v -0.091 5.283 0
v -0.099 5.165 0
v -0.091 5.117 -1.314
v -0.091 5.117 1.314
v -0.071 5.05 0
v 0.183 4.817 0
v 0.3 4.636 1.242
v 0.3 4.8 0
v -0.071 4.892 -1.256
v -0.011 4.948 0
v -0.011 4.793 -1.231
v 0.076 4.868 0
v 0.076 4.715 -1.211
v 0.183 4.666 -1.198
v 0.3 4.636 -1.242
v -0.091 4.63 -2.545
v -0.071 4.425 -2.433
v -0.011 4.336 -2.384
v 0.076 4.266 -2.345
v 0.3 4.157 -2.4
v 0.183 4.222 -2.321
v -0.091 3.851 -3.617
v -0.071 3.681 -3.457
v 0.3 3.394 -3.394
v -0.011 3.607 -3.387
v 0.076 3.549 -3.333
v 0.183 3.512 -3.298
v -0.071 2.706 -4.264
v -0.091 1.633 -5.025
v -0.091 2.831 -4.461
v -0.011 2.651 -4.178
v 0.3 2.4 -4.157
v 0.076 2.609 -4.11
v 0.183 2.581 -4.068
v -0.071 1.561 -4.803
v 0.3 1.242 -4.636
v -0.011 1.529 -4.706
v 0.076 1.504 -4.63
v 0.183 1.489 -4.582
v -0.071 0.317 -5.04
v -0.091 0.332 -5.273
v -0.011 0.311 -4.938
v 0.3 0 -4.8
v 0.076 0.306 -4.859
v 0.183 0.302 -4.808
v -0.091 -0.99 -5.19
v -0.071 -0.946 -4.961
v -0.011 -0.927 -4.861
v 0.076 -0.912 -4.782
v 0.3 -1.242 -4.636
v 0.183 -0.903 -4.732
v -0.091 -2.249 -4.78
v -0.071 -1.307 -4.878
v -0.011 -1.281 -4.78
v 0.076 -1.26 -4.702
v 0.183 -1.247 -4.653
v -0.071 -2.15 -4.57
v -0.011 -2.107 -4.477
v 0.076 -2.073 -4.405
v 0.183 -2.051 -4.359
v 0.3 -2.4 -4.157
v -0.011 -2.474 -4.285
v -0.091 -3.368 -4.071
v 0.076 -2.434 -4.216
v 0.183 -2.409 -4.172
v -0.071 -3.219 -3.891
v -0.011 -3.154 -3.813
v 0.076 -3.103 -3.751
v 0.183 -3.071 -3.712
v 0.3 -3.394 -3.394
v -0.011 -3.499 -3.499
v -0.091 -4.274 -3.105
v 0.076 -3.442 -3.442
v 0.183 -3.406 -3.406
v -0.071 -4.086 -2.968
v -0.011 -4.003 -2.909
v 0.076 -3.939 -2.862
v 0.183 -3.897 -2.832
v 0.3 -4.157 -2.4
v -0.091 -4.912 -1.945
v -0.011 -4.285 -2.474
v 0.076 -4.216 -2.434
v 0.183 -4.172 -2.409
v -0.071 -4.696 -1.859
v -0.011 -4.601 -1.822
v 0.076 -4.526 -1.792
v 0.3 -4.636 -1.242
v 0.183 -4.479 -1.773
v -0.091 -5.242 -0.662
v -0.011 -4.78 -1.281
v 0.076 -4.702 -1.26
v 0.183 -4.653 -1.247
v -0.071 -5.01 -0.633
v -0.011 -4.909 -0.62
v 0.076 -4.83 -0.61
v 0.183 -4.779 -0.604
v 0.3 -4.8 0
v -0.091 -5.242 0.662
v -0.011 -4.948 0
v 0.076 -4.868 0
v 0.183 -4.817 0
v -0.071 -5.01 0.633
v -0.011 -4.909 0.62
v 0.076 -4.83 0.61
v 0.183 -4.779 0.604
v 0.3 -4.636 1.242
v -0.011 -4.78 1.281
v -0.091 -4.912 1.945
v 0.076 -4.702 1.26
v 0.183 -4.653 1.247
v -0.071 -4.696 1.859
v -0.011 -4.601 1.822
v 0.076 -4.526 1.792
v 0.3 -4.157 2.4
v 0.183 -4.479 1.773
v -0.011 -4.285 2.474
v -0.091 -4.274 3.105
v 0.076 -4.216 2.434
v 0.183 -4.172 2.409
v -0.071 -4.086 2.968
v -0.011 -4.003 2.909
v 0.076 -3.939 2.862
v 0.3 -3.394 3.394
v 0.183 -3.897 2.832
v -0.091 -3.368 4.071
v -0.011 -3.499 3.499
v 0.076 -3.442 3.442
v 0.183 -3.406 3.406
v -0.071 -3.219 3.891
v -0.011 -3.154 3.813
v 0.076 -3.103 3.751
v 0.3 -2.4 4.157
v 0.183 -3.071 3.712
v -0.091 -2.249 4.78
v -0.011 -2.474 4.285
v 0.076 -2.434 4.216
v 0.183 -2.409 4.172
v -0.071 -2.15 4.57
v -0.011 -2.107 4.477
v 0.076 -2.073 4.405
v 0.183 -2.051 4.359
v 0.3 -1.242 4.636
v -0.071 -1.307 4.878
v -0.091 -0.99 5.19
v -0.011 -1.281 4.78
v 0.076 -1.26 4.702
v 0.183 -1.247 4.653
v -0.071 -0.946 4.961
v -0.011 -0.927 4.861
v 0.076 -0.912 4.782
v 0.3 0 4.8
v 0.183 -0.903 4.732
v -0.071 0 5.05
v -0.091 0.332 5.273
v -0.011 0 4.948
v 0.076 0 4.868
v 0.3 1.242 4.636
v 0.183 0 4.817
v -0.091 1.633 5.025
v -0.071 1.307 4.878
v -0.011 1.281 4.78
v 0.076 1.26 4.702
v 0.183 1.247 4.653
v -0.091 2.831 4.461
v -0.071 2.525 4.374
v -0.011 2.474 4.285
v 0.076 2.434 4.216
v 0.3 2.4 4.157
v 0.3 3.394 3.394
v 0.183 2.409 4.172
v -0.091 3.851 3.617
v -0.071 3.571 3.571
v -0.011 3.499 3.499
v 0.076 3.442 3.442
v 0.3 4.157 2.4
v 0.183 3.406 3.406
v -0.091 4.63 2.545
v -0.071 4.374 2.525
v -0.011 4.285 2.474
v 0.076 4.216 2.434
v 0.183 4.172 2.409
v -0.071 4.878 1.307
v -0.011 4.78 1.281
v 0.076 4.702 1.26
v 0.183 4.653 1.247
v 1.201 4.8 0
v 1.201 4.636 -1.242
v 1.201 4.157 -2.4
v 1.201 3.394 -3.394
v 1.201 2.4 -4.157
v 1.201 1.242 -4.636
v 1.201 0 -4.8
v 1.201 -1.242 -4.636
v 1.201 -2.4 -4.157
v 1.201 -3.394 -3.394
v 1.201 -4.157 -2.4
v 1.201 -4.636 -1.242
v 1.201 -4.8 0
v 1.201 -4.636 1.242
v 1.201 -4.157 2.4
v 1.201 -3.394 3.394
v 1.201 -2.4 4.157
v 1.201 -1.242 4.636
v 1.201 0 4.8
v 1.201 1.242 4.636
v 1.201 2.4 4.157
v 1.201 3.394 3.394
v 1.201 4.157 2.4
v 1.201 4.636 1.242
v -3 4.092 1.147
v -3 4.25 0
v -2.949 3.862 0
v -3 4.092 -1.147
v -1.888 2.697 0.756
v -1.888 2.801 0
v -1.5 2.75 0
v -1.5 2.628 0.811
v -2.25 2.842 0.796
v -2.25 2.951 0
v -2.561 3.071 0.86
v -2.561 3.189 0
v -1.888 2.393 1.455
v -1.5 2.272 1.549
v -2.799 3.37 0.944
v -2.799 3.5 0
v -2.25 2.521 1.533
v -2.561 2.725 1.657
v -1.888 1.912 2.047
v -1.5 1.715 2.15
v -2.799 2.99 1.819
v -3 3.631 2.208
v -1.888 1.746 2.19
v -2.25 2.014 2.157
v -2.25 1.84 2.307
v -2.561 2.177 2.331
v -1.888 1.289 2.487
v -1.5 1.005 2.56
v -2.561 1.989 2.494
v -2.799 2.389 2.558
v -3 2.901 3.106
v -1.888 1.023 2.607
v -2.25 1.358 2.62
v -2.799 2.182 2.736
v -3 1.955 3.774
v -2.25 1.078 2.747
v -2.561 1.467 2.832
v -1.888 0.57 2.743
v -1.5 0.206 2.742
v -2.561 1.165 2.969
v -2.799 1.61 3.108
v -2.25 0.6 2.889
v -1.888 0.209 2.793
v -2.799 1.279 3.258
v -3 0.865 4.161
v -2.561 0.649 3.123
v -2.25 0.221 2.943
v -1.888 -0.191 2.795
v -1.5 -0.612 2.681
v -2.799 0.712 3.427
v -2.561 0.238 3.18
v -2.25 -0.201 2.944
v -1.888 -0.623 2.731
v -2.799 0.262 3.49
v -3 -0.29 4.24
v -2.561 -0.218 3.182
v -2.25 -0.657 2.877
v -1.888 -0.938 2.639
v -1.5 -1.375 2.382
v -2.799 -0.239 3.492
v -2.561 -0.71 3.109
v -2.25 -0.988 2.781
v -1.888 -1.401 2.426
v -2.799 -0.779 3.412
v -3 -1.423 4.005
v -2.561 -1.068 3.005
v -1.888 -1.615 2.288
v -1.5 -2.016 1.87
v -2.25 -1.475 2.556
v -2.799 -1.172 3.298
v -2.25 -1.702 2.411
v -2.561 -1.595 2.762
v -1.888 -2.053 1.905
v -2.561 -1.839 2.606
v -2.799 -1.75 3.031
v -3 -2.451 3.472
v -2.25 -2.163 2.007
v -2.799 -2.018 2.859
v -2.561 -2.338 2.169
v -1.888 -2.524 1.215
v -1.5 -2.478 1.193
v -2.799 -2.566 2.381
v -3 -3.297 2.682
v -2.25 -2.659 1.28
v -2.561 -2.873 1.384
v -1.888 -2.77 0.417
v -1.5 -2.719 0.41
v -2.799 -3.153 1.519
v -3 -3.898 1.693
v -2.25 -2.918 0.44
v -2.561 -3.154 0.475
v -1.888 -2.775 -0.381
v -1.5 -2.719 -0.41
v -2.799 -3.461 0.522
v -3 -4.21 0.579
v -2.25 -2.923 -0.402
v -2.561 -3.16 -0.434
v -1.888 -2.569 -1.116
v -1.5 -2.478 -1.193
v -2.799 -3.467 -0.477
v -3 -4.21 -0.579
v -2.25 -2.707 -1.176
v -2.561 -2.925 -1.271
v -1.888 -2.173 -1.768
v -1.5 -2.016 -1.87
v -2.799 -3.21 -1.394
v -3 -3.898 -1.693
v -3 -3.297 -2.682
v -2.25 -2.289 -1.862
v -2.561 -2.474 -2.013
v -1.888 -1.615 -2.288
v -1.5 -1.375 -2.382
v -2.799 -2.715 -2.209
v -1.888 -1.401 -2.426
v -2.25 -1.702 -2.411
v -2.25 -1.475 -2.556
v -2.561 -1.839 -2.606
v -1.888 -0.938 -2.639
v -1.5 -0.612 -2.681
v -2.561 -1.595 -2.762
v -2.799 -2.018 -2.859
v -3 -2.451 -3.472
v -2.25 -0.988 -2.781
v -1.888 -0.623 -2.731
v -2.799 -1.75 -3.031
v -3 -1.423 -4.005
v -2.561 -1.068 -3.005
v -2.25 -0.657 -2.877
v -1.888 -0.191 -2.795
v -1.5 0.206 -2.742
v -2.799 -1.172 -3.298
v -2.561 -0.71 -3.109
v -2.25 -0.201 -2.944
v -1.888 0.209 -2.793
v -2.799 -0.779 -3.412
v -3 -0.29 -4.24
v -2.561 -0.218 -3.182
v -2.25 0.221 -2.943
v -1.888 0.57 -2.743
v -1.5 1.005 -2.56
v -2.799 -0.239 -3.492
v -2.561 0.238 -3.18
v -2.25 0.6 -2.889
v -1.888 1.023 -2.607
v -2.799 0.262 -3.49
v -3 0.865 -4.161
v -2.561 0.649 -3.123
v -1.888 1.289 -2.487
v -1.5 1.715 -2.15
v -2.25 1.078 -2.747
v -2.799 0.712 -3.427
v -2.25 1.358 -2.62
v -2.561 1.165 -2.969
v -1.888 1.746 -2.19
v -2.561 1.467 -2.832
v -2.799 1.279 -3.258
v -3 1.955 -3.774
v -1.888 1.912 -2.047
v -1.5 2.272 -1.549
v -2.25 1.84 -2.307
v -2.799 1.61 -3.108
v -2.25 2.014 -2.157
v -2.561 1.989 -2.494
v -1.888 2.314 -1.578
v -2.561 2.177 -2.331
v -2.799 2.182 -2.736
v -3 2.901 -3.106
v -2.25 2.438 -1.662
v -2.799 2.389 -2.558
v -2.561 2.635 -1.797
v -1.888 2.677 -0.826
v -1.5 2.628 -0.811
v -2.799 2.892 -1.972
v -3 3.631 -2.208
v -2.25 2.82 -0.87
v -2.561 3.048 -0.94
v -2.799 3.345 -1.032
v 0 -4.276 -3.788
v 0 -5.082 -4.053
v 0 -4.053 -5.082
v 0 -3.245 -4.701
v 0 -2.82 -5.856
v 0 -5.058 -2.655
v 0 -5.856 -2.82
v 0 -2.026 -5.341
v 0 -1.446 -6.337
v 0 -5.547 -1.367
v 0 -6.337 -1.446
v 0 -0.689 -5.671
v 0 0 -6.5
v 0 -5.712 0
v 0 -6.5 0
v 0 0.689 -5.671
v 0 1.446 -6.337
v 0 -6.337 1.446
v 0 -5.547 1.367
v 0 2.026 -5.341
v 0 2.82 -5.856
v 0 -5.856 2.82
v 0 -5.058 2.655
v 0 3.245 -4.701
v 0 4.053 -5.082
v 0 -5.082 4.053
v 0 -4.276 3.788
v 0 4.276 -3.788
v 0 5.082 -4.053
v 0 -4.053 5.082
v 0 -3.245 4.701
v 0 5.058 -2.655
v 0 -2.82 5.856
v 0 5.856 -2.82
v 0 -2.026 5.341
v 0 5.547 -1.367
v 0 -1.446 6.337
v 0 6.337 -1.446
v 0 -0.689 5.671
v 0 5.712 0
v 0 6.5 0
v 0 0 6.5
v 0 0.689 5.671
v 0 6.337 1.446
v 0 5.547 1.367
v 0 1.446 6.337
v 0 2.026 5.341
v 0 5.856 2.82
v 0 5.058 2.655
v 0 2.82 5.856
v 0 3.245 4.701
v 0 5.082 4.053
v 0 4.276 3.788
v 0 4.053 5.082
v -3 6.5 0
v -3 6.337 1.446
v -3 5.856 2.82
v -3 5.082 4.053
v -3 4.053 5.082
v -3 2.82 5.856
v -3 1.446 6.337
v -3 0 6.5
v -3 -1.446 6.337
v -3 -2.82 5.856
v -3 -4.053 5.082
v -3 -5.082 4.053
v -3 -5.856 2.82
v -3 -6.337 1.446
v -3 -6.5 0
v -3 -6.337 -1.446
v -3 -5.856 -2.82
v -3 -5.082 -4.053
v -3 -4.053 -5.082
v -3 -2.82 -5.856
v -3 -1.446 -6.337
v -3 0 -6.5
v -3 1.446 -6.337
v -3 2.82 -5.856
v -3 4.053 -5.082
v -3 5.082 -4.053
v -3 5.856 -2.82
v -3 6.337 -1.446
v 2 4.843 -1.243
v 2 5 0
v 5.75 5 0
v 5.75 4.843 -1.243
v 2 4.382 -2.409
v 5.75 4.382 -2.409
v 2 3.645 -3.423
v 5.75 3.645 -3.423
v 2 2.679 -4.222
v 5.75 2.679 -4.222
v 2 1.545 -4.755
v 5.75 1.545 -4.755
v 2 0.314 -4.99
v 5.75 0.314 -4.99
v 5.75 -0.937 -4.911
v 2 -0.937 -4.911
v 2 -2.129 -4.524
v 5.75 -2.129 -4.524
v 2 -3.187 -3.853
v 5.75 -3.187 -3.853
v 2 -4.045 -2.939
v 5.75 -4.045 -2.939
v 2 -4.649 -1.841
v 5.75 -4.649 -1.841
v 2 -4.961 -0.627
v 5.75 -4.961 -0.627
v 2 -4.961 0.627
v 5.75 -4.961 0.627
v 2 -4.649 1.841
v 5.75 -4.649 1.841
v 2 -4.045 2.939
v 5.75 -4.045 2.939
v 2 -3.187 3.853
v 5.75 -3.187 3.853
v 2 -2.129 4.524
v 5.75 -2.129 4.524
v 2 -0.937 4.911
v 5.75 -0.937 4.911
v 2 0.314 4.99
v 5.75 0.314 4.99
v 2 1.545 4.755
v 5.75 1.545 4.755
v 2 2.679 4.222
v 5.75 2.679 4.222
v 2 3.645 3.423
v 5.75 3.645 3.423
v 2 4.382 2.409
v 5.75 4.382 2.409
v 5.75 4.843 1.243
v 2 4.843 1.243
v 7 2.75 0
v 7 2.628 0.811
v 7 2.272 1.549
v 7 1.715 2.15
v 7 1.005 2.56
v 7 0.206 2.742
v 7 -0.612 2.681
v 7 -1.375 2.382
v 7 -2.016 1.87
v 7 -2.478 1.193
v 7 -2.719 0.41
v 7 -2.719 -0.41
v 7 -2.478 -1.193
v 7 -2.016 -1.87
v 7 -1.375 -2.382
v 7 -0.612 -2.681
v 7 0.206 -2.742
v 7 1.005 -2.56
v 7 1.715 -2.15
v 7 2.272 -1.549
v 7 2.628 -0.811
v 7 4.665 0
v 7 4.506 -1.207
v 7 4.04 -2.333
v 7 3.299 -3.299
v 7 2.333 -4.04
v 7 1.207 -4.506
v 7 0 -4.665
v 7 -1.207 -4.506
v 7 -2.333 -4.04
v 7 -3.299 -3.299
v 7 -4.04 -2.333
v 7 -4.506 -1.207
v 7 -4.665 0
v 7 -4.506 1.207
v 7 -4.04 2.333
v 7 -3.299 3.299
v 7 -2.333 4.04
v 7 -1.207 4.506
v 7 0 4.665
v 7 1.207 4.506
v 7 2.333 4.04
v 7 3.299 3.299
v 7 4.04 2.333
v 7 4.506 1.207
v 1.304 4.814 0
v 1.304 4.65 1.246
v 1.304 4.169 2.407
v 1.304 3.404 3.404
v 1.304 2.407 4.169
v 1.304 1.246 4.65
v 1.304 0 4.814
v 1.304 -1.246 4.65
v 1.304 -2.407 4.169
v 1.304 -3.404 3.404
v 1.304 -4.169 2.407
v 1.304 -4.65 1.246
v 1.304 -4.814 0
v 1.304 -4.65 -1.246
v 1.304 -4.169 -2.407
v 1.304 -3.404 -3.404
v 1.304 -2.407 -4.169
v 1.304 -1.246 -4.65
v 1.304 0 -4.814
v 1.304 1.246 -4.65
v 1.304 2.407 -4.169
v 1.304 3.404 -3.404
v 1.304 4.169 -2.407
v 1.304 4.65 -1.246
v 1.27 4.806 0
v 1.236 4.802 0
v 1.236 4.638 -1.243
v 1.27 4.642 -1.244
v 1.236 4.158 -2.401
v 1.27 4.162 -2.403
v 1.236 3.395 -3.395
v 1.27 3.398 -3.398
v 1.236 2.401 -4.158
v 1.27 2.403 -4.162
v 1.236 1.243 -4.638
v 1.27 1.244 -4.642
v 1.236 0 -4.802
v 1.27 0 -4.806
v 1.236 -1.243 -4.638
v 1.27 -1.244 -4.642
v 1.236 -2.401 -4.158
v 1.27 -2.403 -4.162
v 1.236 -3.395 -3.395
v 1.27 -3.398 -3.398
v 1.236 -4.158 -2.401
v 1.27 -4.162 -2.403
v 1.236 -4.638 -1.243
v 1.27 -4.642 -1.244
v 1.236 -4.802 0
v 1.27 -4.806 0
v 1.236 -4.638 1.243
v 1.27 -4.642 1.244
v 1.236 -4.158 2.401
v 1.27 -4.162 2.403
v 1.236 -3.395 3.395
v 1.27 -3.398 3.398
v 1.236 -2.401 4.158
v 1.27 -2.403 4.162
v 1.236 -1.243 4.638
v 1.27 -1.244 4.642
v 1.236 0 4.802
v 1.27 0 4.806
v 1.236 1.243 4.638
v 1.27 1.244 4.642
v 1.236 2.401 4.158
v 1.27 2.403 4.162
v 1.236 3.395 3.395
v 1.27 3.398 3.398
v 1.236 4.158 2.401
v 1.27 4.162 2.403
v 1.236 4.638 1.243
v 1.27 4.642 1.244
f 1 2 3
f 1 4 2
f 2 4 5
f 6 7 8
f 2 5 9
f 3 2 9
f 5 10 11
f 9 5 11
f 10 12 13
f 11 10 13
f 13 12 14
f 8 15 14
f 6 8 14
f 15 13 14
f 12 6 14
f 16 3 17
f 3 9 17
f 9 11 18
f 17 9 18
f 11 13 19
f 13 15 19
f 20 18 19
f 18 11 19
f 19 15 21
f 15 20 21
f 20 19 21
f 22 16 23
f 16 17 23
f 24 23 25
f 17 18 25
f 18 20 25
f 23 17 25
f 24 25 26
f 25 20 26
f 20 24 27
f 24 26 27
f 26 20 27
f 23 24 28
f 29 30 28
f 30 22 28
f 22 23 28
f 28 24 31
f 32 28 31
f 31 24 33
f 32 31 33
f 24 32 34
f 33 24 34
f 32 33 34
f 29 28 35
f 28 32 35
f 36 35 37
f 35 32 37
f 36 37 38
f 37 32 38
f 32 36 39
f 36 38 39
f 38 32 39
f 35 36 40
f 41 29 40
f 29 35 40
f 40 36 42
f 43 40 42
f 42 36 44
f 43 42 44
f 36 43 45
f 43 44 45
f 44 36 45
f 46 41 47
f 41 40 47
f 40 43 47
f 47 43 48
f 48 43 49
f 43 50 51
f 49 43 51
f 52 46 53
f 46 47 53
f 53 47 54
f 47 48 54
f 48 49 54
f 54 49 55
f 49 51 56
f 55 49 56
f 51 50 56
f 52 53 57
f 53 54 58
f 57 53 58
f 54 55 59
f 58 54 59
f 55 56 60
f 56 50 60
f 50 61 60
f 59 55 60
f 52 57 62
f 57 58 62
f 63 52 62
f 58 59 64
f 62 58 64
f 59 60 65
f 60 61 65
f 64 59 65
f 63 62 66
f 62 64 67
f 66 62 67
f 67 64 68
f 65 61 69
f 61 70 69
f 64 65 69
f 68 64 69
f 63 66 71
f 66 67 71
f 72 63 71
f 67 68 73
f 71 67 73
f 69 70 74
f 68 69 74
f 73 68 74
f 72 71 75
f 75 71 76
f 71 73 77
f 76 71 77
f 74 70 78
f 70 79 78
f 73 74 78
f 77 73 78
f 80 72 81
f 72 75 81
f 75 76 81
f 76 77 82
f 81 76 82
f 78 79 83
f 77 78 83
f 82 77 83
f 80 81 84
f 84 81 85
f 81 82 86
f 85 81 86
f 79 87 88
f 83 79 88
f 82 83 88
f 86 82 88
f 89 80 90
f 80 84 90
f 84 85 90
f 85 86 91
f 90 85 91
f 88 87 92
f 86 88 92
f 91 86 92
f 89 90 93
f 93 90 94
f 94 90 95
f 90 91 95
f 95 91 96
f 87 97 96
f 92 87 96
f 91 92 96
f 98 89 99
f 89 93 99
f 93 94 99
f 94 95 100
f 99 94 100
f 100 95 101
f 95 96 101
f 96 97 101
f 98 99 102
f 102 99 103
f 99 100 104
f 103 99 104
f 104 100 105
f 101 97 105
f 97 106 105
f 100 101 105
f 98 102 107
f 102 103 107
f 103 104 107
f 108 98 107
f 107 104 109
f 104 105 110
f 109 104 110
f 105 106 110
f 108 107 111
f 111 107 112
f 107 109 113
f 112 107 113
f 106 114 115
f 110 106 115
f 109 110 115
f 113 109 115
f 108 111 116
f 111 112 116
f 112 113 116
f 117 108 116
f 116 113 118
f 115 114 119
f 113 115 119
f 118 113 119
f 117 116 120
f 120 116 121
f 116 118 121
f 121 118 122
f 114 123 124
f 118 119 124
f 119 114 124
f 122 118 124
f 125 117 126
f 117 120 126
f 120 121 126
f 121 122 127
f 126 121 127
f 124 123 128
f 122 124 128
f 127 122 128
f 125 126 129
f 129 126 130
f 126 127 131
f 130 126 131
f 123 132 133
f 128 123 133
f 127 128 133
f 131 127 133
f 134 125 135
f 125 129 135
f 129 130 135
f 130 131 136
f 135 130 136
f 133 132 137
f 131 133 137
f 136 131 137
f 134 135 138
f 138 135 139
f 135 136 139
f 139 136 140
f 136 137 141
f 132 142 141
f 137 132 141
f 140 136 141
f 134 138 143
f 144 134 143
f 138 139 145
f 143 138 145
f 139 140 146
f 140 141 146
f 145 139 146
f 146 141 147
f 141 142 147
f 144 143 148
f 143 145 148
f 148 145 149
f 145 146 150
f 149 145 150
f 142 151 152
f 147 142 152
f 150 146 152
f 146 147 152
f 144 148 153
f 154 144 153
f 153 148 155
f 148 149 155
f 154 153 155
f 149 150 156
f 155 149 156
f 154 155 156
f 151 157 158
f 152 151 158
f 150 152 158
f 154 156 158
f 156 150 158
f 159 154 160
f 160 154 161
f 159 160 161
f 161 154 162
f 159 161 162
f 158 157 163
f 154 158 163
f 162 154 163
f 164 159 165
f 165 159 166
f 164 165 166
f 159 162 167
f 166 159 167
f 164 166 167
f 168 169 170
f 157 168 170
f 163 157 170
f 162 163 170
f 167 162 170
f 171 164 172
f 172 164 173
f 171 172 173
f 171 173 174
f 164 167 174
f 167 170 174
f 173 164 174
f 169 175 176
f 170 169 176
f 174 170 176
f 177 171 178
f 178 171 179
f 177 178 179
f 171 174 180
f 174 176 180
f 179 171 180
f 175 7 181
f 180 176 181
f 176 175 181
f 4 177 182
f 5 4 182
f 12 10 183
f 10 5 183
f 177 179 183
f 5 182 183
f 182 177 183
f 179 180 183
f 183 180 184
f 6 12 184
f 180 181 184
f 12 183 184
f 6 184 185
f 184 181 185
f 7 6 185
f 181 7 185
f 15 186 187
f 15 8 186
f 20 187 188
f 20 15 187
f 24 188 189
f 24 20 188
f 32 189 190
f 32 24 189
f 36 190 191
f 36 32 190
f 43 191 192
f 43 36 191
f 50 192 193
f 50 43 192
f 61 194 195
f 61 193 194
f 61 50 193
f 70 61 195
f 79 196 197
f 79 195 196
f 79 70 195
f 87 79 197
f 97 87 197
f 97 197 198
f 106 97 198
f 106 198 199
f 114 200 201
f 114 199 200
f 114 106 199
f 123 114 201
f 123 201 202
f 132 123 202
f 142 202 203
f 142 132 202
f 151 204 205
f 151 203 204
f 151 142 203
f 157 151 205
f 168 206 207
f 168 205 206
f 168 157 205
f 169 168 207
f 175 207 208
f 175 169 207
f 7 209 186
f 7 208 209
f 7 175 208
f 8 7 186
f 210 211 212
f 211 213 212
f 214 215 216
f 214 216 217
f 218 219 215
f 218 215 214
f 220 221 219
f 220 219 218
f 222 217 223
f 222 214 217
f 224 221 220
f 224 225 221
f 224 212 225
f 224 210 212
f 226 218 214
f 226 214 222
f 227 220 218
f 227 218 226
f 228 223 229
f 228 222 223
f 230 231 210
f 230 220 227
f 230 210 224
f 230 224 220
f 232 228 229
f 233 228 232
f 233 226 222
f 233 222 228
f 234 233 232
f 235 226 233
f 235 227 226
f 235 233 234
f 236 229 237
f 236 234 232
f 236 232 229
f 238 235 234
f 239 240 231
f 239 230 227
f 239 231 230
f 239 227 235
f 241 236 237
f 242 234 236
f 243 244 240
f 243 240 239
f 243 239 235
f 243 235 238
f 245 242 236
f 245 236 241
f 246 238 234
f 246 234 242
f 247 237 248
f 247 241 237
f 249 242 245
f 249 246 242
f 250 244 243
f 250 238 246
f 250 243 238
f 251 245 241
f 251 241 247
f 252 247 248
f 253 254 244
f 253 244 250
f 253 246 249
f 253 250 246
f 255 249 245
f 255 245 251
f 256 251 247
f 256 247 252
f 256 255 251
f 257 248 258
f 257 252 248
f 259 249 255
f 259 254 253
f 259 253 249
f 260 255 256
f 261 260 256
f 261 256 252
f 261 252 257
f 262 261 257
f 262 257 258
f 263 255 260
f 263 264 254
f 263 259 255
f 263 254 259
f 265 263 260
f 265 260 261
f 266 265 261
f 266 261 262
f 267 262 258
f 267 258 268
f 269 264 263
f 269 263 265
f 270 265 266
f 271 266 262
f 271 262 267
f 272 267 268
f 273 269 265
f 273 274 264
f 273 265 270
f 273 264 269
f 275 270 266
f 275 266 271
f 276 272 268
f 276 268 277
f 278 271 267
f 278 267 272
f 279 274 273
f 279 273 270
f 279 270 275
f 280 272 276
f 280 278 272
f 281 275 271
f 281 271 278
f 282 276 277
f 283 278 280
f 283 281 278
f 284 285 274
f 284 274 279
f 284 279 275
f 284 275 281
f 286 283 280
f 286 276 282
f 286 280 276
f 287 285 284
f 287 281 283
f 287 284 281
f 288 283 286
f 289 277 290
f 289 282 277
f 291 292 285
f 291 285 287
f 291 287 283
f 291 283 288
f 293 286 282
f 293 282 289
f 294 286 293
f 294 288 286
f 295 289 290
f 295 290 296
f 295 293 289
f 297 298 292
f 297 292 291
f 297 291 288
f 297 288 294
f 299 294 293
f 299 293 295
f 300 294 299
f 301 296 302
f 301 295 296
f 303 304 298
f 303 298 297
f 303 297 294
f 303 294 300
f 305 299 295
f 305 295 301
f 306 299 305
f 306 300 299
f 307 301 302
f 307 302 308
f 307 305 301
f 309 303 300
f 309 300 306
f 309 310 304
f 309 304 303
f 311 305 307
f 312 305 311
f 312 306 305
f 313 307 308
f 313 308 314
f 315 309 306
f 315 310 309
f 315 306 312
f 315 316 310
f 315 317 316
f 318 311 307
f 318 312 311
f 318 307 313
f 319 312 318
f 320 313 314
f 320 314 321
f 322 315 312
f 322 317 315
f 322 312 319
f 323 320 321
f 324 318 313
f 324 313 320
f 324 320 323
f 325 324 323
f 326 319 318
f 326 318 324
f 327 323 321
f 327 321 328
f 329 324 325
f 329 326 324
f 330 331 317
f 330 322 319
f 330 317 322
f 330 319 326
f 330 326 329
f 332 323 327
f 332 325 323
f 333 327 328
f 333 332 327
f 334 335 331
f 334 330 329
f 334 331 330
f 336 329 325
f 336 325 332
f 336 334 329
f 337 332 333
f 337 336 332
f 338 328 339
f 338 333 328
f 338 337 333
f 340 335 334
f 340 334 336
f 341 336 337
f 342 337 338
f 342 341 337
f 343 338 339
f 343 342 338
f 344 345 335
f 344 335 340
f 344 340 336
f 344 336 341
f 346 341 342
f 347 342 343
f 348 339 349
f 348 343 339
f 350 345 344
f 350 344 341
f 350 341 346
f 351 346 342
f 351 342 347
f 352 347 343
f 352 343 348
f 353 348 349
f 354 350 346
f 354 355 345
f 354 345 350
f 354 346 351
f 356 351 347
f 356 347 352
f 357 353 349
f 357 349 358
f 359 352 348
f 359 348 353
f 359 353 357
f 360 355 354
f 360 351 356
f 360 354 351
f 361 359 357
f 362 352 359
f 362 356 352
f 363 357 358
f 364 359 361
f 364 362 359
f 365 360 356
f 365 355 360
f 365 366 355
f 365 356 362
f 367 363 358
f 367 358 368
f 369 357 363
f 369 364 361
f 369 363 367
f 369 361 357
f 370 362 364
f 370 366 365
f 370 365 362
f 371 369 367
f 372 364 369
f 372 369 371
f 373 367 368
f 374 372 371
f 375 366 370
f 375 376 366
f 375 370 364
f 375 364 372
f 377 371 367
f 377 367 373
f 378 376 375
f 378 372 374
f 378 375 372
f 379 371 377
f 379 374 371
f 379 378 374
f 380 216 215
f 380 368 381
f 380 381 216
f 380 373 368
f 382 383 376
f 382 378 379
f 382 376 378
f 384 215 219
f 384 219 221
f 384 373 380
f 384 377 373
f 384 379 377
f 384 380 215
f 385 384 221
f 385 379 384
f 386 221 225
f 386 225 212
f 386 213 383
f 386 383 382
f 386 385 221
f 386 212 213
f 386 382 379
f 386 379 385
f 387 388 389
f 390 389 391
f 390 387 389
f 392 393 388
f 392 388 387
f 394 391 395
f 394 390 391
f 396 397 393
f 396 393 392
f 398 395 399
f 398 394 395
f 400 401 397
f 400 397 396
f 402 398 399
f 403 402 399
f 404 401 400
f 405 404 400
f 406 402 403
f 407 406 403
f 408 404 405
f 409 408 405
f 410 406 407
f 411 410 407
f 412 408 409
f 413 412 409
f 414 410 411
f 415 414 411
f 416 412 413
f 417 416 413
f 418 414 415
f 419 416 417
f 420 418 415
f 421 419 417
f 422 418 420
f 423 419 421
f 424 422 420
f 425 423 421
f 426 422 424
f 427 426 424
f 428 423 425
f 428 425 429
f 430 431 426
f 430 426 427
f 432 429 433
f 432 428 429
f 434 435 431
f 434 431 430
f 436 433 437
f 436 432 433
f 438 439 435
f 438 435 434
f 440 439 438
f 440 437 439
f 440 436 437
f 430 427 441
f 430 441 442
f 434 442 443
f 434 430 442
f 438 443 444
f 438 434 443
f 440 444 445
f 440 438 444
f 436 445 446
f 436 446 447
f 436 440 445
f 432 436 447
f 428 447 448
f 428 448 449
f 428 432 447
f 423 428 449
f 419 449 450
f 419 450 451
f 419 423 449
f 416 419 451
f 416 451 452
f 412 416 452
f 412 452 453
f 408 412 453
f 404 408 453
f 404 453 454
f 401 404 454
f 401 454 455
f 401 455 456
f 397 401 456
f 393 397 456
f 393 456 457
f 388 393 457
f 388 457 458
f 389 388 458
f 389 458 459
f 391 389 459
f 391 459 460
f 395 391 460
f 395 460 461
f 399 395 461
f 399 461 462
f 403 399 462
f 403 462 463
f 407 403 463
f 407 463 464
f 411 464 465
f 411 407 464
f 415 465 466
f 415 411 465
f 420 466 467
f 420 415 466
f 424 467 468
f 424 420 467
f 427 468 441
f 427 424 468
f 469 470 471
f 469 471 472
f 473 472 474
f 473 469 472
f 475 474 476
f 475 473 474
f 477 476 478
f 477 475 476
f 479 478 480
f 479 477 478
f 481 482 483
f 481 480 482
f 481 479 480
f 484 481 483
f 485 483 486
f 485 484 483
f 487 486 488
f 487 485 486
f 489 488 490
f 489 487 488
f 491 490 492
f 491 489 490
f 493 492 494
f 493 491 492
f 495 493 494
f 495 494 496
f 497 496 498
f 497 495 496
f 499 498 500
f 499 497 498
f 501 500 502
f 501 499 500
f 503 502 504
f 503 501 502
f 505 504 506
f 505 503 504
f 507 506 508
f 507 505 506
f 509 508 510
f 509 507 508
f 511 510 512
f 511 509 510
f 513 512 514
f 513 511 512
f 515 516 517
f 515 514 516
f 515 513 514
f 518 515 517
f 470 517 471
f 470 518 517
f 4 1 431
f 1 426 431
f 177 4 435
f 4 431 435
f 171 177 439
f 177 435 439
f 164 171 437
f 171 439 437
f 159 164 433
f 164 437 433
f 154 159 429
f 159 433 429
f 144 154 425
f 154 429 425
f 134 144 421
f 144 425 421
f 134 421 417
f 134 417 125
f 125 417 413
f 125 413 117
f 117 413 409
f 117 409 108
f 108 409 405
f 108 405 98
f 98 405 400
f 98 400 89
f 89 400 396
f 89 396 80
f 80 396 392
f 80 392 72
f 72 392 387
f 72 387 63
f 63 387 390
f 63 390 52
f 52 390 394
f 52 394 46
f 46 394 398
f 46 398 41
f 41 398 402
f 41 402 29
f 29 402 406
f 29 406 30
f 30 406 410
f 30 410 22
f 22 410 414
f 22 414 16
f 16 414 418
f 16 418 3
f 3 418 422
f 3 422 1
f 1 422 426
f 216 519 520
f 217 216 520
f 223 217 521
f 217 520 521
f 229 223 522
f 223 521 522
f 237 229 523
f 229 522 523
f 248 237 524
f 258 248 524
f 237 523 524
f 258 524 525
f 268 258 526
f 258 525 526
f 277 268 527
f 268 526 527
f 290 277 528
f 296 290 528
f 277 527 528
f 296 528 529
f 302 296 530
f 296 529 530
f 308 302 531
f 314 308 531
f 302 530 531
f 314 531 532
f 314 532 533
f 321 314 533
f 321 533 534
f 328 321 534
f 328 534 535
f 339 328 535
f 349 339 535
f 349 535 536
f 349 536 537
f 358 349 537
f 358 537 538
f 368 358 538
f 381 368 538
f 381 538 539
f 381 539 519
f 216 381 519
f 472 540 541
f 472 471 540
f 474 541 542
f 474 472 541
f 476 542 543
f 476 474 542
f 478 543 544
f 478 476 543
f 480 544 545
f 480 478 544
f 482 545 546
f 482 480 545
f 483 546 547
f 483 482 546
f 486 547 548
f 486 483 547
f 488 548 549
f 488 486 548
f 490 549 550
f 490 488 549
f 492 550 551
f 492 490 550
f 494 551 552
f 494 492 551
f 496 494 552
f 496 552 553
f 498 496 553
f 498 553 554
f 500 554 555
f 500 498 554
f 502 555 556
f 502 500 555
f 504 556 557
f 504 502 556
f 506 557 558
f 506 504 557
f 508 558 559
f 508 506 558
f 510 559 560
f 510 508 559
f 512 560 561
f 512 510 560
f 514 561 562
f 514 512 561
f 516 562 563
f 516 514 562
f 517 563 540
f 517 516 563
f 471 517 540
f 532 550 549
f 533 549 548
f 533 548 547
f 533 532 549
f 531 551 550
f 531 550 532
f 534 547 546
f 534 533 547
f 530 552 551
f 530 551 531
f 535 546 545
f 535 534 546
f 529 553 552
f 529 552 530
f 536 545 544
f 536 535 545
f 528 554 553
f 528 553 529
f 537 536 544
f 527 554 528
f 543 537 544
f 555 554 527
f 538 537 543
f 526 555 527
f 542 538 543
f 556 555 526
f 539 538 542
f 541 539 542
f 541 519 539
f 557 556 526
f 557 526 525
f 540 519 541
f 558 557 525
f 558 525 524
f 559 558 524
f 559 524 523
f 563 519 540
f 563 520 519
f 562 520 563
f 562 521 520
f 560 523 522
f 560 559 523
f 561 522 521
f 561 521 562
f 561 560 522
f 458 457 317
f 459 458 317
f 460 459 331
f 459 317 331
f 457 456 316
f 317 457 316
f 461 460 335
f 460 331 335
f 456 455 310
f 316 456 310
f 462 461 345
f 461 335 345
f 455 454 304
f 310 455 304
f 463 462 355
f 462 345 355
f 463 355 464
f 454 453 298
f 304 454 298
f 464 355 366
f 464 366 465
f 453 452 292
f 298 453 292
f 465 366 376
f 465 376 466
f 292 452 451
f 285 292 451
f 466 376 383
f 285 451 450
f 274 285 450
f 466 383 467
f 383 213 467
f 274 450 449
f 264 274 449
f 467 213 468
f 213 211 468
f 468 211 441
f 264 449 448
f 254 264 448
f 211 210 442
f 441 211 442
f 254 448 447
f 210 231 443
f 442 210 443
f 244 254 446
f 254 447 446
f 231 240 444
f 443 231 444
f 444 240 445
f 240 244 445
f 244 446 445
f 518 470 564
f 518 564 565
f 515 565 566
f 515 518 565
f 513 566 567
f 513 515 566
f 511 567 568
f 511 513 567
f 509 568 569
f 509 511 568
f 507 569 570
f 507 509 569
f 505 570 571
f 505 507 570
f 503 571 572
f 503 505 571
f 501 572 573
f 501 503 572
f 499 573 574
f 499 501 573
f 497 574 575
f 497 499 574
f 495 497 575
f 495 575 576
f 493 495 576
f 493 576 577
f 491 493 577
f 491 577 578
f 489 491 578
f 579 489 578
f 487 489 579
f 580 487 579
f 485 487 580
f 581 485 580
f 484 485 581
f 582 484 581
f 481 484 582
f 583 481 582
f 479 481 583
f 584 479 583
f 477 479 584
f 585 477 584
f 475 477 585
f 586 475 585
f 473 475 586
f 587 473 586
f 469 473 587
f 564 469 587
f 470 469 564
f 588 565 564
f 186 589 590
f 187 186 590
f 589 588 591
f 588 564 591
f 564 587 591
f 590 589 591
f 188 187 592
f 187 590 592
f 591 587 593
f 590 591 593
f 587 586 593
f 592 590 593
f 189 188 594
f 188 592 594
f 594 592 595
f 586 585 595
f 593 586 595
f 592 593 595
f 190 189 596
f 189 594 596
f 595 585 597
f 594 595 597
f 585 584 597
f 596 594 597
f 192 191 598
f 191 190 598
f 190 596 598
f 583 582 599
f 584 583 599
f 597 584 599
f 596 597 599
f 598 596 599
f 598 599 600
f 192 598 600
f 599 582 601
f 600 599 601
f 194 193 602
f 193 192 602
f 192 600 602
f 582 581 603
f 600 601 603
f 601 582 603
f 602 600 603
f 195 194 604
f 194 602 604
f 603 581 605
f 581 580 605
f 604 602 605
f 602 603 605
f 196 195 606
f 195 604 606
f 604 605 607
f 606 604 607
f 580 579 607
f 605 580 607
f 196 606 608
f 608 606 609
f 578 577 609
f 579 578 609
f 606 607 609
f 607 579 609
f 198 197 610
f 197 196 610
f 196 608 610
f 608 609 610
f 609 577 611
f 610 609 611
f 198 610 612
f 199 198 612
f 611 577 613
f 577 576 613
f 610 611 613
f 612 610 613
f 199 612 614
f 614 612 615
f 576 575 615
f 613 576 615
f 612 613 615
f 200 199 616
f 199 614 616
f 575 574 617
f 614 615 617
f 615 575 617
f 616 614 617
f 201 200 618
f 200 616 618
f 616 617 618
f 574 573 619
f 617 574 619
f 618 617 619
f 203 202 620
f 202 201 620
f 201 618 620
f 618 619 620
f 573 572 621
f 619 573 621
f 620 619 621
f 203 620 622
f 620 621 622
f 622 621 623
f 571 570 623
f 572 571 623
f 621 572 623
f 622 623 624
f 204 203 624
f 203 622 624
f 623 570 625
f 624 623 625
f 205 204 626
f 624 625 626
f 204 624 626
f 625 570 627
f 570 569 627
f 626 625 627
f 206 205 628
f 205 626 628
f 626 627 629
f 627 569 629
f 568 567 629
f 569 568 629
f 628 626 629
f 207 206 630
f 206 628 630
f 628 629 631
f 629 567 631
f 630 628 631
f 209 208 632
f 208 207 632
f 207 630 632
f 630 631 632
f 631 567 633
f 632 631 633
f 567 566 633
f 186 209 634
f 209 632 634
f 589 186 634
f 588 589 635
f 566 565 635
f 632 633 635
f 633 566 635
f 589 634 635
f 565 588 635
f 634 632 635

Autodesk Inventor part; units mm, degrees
ref_plane "YZ Plane" through (0, 0, 0) normal (1, 0, 0) x (0, 1, 0)
ref_plane "XZ Plane" through (0, 0, 0) normal (0, 1, 0) x (-1, 0, 0)
ref_plane "XY Plane" through (0, 0, 0) normal (0, 0, 1) x (1, 0, 0)
sketch "Skizze1" plane through (0, 0, 0) normal (0, 0, 1) x (1, 0, 0)
  line L0 (-2.5, 0) -> (5.5, 0)
  line L1 (7, 2.75) -> (7, 5)
  line L2 (7, 5) -> (2, 5)
  line L3 (-3, 2.75) -> (-3, 6.5)
  line L4 (-3, 6.5) -> (0, 6.5)
  line L5 (2, 5) -> (1.3045, 4.8136)
  line L6 (1.2009, 4.8) -> (0.3, 4.8)
  line L7 (-0.0913, 5.2832) -> (0, 5.7125)
  line L8 (0, 5.7125) -> (0, 6.5)
  arc A0 (-0.0913, 5.2832) -> (0.3, 4.8) centre (0.3, 5.2) ccw
  arc A1 (1.2009, 4.8) -> (1.3045, 4.8136) centre (1.2009, 5.2) ccw
  line L9 (-28.4, 0) -> (128.4, 0) projected
  line L10 (0, -12) -> (0, 72) projected
  line L11 (-3, 2.75) -> (7, 2.75)
  dimension "d0" = 13
  dimension "d1" = 10
  dimension "d2" = 10
  dimension "d3" = 12
  dimension "d4" = 0.4
  dimension "d5" = 0.1
  dimension "d6" = 2
  dimension "d7" = 15
  dimension "d8" = 0.2
  dimension "d9" = 0.4
  dimension "d10" = 3
  dimension "d11" = 5.5
revolve "Körper" add sketch "Skizze1" angle 360 about axis through (-2.5, 0, 0) along (1, 0, 0) contours L11 L10 A0 L6 A1 L5 L2 L1 | L11 L3 L4 L8 L7 A0 L10
chamfer "Fase1" distance 1.25 angle 15 1 edges at (7, -5, 0) measured on face at (5.3333, 4.9353, -0.8021)
fillet "Rundung1" radius 1.5 1 edges at (-3, -2.75, 0)
equation "\"d12\" = PHH"
equation "\"d13\" = ANG"
equation "\"d29\" = PHH"
equation "\"d14\" = RR"
equation "\"d0\" = KOD"
equation "\"d1\" = SD2"
equation "\"d2\" = NLG"
equation "\"d4\" = FSRR"
equation "\"d5\" = FST2"
equation "\"d6\" = FSB"
equation "\"d8\" = FST1"
equation "\"d9\" = FSRR"
equation "\"d10\" = KOH"
equation "\"d11\" = NND"
equation "\"NLG\" = 10"
equation "\"NND\" = 5.5"
equation "\"KOD\" = 13"
equation "\"KOH\" = 3"
equation "\"SD2\" = 10"
equation "\"FST1\" = 0.2"
equation "\"FST2\" = 0.1"
equation "\"FSB\" = 2"
equation "\"FSRR\" = 0.4"
equation "\"PHH\" = 1.25"
equation "\"ANG\" = 15deg"
equation "\"RR\" = 1.5"
equation "\"NNDMIN\" = 5.1"
equation "\"FSH\" = 1.1"
equation "\"NNDMAX\" = 6"
equation "\"SEWI\" = 30deg"
properties part number "DIN 172 - A 5,5 x 10" material "Stahl, weich"
